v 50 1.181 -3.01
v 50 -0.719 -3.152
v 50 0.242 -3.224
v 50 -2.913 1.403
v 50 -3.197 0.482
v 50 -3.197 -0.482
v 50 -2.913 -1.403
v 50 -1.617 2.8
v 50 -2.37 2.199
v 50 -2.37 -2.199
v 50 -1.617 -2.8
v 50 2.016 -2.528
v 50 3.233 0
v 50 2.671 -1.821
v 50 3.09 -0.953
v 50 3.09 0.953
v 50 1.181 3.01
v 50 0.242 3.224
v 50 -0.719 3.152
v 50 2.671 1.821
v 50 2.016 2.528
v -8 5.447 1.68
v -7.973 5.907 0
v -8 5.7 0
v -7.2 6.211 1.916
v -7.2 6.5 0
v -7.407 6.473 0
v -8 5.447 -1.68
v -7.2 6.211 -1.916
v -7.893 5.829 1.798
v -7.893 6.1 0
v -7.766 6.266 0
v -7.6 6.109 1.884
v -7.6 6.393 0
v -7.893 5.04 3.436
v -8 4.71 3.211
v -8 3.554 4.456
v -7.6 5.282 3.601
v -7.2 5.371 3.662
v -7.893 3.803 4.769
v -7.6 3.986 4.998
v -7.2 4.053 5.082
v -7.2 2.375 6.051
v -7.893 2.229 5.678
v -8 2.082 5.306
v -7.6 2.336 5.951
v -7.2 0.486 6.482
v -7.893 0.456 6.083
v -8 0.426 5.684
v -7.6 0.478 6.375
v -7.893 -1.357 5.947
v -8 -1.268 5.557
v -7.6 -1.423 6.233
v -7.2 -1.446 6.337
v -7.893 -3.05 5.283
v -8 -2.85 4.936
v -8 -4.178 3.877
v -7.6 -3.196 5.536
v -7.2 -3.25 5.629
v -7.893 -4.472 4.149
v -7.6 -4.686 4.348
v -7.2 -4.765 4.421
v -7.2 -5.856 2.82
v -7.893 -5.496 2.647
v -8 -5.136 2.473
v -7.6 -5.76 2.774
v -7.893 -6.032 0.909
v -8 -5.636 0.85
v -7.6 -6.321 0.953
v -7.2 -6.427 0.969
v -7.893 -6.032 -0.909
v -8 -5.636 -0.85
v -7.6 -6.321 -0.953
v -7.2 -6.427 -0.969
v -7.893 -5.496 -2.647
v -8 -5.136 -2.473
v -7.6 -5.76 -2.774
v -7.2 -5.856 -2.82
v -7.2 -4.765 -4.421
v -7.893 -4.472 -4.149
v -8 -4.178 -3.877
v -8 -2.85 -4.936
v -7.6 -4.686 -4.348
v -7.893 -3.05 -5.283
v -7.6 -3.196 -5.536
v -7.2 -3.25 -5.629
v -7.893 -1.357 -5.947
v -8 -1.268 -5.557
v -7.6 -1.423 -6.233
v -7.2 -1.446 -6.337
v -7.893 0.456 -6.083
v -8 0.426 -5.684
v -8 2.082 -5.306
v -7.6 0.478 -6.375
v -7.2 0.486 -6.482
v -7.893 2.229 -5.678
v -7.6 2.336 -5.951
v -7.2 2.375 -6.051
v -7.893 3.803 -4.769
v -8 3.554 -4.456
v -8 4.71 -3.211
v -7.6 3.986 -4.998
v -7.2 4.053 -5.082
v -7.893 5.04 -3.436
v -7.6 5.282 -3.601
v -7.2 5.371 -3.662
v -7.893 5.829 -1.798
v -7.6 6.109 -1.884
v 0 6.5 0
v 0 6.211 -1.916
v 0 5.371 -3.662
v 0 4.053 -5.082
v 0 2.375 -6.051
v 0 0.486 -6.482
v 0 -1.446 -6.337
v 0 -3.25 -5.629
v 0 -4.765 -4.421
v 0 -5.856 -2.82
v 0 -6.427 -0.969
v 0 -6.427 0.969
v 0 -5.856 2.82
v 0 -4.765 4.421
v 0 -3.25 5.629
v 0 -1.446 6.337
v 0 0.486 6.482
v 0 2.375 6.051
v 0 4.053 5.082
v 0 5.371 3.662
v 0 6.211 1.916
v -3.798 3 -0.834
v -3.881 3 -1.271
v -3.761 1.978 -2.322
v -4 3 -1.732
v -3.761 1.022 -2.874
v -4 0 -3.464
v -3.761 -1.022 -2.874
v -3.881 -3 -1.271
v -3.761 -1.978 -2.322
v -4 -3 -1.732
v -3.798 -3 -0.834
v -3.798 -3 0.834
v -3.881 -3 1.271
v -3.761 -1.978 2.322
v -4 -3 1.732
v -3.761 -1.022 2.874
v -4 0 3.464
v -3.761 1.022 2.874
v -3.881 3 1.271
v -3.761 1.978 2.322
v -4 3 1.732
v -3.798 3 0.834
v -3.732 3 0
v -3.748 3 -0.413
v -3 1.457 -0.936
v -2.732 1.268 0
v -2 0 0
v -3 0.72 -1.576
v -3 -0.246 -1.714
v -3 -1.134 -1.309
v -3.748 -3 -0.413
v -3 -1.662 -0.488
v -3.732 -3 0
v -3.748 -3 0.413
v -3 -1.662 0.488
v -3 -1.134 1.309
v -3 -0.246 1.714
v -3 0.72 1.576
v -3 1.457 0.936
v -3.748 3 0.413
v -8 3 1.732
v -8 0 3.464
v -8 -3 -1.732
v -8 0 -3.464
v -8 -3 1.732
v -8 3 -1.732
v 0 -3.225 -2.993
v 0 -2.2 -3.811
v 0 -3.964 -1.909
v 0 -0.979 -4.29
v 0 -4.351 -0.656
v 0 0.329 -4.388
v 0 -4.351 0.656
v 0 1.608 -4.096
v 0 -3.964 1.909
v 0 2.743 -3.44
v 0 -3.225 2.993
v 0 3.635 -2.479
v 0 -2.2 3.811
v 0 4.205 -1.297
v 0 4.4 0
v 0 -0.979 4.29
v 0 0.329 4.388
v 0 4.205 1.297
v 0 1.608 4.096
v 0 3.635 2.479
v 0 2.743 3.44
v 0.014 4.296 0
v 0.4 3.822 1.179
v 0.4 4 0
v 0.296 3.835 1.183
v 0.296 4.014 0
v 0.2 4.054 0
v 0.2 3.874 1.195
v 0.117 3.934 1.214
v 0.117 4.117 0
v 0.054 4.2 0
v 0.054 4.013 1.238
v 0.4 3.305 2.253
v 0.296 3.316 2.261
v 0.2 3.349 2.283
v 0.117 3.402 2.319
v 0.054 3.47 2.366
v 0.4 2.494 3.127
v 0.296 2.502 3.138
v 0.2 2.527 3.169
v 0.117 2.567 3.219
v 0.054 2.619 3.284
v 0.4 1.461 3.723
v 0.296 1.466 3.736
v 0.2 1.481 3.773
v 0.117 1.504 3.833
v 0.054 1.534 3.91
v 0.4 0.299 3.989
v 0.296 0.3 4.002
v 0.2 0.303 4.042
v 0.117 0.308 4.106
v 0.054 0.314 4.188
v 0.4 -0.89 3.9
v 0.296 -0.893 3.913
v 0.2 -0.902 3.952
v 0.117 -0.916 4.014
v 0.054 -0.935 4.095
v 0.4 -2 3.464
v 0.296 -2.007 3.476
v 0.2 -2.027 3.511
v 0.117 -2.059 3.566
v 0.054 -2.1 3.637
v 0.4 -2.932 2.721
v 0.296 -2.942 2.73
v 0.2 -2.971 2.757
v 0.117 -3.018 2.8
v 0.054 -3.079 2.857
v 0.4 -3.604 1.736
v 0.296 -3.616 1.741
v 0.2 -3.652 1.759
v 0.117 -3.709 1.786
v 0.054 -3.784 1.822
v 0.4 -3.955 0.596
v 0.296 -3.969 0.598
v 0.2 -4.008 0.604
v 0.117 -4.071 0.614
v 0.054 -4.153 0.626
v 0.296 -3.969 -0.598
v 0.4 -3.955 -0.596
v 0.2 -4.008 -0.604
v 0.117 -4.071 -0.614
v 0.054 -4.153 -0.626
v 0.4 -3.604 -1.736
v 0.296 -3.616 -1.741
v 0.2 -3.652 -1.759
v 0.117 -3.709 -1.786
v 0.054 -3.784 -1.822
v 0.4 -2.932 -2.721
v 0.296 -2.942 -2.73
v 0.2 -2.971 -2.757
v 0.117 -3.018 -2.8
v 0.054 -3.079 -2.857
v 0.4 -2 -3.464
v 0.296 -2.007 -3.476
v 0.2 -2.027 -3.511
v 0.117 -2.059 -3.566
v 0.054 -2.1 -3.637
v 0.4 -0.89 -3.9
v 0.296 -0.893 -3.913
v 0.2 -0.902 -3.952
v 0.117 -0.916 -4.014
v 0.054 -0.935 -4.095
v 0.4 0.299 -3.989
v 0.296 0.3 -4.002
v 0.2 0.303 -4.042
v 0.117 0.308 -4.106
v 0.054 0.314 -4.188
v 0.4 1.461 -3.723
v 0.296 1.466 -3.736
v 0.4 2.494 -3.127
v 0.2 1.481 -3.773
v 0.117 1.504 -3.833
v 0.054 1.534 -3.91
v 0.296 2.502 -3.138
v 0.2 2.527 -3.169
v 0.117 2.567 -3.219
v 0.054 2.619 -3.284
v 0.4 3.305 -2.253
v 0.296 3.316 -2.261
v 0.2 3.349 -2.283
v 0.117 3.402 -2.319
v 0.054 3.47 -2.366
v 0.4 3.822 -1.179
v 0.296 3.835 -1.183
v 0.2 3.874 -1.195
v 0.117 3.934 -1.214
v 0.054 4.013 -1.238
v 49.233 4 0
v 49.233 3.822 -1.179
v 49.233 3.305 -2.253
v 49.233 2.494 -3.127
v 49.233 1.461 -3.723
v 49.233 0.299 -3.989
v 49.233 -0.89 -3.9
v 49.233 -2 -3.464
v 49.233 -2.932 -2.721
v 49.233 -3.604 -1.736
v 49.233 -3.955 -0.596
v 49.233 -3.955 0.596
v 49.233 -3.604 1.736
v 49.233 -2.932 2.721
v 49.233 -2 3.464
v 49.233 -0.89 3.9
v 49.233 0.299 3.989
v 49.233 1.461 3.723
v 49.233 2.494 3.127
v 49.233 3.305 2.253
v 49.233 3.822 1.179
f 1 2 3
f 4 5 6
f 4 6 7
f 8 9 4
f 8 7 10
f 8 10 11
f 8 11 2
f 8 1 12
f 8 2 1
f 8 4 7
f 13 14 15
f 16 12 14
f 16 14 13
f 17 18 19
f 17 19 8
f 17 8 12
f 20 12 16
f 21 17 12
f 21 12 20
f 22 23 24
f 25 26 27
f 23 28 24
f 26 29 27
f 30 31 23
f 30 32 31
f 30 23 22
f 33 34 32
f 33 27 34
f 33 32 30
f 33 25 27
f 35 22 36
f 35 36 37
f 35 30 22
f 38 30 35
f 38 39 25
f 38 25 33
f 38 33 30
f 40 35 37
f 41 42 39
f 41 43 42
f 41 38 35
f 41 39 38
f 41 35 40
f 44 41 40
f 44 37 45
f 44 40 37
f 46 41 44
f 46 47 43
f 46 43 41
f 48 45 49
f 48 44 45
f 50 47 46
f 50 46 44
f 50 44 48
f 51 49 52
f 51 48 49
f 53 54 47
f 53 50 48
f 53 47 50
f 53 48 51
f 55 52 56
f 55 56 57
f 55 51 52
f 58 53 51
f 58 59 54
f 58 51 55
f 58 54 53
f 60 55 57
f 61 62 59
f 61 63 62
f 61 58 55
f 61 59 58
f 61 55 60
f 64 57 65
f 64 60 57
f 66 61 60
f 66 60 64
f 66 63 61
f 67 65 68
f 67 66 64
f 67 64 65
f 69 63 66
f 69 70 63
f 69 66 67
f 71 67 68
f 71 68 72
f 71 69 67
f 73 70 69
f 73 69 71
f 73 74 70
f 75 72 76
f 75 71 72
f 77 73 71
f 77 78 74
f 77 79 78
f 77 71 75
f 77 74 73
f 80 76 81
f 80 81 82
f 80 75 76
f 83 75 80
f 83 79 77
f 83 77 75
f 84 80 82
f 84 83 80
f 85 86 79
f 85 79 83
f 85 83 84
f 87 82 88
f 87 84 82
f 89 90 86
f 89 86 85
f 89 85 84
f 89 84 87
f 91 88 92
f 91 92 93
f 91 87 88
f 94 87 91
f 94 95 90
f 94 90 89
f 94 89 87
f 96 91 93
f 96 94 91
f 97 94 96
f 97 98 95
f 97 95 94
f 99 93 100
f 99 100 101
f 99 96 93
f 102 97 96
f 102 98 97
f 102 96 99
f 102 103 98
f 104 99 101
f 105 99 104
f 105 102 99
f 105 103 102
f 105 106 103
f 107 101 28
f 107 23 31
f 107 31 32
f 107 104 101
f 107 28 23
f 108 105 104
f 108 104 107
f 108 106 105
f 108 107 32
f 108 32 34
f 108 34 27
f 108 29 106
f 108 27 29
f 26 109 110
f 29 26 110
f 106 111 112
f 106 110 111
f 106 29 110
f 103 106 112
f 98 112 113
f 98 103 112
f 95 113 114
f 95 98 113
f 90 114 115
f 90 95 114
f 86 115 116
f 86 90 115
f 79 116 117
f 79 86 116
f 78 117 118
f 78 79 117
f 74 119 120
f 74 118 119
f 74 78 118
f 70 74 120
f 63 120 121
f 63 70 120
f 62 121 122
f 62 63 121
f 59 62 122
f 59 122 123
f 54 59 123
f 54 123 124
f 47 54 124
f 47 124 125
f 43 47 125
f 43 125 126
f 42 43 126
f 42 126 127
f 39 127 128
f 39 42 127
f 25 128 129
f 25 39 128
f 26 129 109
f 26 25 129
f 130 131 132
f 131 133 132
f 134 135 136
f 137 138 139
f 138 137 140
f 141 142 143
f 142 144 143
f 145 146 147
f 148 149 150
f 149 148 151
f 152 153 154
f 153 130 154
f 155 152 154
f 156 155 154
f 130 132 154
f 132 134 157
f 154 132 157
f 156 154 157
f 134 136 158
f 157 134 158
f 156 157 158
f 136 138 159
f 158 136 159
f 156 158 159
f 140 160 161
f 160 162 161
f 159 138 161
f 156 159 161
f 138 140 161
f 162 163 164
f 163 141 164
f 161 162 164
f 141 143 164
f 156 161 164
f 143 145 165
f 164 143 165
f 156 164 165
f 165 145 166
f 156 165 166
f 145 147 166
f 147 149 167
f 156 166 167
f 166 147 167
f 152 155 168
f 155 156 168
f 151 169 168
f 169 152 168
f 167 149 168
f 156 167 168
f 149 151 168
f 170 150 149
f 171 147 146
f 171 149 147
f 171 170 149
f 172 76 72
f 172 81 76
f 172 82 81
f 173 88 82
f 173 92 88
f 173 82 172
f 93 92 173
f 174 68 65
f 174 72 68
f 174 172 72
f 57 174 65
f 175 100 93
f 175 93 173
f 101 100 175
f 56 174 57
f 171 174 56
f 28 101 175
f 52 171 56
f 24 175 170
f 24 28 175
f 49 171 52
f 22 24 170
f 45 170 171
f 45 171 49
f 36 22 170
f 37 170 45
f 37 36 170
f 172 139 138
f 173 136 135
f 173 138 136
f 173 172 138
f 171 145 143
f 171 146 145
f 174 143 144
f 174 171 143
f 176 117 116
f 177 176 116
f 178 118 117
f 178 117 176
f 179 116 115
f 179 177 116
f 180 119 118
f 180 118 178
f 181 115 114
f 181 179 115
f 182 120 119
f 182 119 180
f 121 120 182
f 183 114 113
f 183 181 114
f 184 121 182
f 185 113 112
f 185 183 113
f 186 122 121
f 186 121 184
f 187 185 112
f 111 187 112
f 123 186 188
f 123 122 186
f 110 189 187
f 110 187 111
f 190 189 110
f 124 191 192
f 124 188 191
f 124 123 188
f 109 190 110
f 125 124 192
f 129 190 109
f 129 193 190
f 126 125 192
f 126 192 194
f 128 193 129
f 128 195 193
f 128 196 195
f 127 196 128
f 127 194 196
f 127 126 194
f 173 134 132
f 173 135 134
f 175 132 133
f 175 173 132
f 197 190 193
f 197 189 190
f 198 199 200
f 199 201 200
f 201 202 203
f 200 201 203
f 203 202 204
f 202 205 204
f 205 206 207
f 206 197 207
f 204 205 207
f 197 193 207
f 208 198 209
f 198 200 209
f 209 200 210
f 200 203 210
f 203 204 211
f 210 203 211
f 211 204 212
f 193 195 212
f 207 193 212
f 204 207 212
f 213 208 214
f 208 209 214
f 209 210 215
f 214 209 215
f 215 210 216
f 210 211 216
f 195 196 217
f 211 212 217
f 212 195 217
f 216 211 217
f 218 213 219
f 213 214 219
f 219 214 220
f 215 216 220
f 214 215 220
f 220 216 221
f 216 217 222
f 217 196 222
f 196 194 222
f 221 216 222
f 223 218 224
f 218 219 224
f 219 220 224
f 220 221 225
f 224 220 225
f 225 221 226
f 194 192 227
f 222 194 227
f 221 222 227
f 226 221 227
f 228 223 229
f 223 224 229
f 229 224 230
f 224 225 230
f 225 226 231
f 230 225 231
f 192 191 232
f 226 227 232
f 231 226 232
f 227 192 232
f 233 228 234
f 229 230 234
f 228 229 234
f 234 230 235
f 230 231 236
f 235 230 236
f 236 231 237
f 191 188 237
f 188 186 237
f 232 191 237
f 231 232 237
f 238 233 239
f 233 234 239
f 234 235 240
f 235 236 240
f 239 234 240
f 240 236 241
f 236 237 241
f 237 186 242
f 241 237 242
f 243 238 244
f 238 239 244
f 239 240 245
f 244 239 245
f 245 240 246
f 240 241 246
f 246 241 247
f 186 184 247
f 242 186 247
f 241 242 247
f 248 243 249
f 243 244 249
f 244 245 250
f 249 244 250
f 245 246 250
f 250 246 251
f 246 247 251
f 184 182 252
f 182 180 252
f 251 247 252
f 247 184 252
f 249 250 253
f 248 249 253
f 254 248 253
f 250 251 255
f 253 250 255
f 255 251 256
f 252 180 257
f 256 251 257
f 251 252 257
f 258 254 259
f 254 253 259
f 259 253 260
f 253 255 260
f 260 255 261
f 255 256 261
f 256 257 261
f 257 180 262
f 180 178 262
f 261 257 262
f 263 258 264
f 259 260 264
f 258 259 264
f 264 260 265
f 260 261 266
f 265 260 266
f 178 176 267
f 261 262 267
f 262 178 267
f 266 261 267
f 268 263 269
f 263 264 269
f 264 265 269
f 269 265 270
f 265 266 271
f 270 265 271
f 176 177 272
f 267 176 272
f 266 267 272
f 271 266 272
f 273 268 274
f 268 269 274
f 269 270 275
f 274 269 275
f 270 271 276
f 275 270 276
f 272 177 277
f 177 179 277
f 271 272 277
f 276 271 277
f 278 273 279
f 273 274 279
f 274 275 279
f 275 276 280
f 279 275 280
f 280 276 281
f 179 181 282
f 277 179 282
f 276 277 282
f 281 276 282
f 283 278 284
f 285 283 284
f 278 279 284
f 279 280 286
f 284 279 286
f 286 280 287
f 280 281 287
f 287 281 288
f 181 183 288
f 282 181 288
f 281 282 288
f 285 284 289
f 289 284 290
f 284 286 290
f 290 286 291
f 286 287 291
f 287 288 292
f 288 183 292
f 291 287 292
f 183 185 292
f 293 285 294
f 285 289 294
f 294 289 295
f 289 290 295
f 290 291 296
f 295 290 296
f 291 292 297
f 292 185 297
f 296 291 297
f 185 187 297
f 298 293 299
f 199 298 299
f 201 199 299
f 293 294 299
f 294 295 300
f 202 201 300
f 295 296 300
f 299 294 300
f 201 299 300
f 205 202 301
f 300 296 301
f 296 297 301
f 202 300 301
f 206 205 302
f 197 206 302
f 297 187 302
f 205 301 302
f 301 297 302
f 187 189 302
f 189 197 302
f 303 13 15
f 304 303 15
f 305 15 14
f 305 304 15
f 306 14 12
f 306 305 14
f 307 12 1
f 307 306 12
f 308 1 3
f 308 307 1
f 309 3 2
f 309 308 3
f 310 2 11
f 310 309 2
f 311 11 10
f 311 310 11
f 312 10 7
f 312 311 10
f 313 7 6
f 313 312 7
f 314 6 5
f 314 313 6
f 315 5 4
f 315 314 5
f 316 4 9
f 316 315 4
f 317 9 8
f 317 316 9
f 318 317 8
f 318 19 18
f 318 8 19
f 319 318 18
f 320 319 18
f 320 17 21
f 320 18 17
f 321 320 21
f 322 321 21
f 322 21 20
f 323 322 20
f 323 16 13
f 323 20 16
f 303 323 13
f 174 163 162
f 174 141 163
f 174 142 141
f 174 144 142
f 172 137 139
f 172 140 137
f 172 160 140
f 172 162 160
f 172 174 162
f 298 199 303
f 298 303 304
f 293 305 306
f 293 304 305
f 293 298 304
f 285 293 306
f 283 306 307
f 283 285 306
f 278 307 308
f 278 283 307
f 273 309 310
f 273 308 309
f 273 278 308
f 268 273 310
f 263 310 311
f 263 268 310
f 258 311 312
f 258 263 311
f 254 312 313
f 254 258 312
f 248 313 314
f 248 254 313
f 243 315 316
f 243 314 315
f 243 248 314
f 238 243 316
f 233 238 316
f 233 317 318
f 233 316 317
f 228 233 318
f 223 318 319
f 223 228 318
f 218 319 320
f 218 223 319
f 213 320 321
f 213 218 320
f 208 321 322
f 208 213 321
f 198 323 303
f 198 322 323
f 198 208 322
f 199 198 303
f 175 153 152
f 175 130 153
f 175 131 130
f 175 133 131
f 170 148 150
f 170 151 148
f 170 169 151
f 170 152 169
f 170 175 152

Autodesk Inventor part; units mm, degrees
ref_plane "YZ Plane" through (0, 0, 0) normal (1, 0, 0) x (0, 1, 0)
ref_plane "XZ Plane" through (0, 0, 0) normal (0, 1, 0) x (-1, 0, 0)
sketch "Skizze1" plane through (0, 0, 0) normal (0, 0, 1) x (1, 0, 0)
  line L0 (-2, 0) -> (50, 0)
  line L1 (50, 0) -> (50, 4)
  line L2 (50, 4) -> (22, 4)
  line L3 (22, 4) -> (21.2331, 4)
  line L4 (21.2331, 4) -> (0, 4)
  line L5 (0, 4) -> (0, 6.5)
  line L6 (0, 6.5) -> (-8, 6.5)
  line L7 (-8, 6.5) -> (-8, 3.4641)
  line L8 (-8, 3.4641) -> (-4, 3.4641)
  line L9 (-4, 3.4641) -> (-2, 0)
  line L10 (-19.6, 0) -> (61.6, 0) projected
  line L11 (0, -1.3) -> (0, 7.8) projected
  line L12 (22, 4) -> (0, 4) construction
  dimension "d1" = 28
  dimension "d2" = 0.7669
  dimension "d3" = 8
  dimension "d4" = 4
  dimension "d5" = 60
  dimension "d6" = 8
  dimension "d7" = 8
  dimension "d8" = 6.9282
  dimension "d9" = 13
  dimension "d26" = 50
revolve "Körper" add sketch "Skizze1" angle 360 about axis through (-2, 0, 0) along (1, 0, 0)
sketch "Skizze2" plane through (-8, 0, 0) normal (-1, 0, 0) x (0, 0, 1)
  circle A0 centre (0, 0) radius 3.4641 projected
  line L0 (0, -9.1) -> (0, 9.1) projected
  line L1 (-9.1, 0) -> (9.1, 0) projected
  line L2 (3.4641, 0) -> (1.7321, -3)
  line L3 (1.7321, -3) -> (-1.7321, -3)
  line L4 (-1.7321, -3) -> (-3.4641, 0)
  line L5 (-3.4641, 0) -> (-1.7321, 3)
  line L6 (-1.7321, 3) -> (1.7321, 3)
  line L7 (1.7321, 3) -> (3.4641, 0)
extrude "Loch" add sketch "Skizze2" against normal up to next contours L7 A0 | A0 L2 | L6 L0 A0 | A0 L0 L3 | L0 L6 A0 | A0 L3 L0 | L4 A0 | A0 L5
fillet "Rundung1" radius 0.8 1 edges at (-8, -6.5, 0)
thread "Gewinde" size "M8x1.25" class "6g" standard "ISO Metric profile" length 28
chamfer "Fase1" distance 0.7668 distance2 0.7668 1 edges at (50, -4, 0) measured on face at (50, -0.3588, -0.308)
ref_plane "Work Plane1" through (29, 0, 0) normal (0, -1, 0) x (1, 0, 0)
fillet "Fillet2" radius 0.4 1 edges at (0, -4, 0)
equation "\"d1\" = GEL"
equation "\"d3\" = KOH"
equation "\"d4\" = INTI"
equation "\"d6\" = GD"
equation "\"d7\" = BDM"
equation "\"d8\" = 1.1547 * SW"
equation "\"d9\" = KOD"
equation "\"d26\" = NLG"
equation "\"d30\" = R"
equation "\"d17\" = RR"
equation "\"d13\" = GEL"
equation "\"d15\" = -0.5 * SPD + 0.5 * GD"
equation "\"d16\" = GUL"
equation "\"GD\" = NND"
equation "\"NLG\" = 50"
equation "\"GEL\" = 28"
equation "\"KOD\" = 13"
equation "\"KOH\" = 8"
equation "\"INTI\" = 4"
equation "\"GAL\" = 0.61345 * PTC"
equation "\"GUL\" = 0.61345 * PTC"
equation "\"BDM\" = NND"
equation "\"SW\" = 6"
equation "\"RR\" = 0.8"
equation "\"SPD\" = NND - 1.2269 * PTC"
equation "\"R\" = 0.4"
equation "\"TOA\" = 30deg"
equation "\"GD1\" = THREADDIA - 1.2269 * PTC"
equation "\"THREADDIA\" = 8"
equation "\"FAWI\" = 45deg"
equation "\"ANG\" = 120deg"
equation "\"PTC\" = 1.25"
equation "\"NND\" = 8"
equation "\"E0\" = 1.155 * SW"
properties part number "DIN 912 - M8 x 50" material "Stahl, weich"
